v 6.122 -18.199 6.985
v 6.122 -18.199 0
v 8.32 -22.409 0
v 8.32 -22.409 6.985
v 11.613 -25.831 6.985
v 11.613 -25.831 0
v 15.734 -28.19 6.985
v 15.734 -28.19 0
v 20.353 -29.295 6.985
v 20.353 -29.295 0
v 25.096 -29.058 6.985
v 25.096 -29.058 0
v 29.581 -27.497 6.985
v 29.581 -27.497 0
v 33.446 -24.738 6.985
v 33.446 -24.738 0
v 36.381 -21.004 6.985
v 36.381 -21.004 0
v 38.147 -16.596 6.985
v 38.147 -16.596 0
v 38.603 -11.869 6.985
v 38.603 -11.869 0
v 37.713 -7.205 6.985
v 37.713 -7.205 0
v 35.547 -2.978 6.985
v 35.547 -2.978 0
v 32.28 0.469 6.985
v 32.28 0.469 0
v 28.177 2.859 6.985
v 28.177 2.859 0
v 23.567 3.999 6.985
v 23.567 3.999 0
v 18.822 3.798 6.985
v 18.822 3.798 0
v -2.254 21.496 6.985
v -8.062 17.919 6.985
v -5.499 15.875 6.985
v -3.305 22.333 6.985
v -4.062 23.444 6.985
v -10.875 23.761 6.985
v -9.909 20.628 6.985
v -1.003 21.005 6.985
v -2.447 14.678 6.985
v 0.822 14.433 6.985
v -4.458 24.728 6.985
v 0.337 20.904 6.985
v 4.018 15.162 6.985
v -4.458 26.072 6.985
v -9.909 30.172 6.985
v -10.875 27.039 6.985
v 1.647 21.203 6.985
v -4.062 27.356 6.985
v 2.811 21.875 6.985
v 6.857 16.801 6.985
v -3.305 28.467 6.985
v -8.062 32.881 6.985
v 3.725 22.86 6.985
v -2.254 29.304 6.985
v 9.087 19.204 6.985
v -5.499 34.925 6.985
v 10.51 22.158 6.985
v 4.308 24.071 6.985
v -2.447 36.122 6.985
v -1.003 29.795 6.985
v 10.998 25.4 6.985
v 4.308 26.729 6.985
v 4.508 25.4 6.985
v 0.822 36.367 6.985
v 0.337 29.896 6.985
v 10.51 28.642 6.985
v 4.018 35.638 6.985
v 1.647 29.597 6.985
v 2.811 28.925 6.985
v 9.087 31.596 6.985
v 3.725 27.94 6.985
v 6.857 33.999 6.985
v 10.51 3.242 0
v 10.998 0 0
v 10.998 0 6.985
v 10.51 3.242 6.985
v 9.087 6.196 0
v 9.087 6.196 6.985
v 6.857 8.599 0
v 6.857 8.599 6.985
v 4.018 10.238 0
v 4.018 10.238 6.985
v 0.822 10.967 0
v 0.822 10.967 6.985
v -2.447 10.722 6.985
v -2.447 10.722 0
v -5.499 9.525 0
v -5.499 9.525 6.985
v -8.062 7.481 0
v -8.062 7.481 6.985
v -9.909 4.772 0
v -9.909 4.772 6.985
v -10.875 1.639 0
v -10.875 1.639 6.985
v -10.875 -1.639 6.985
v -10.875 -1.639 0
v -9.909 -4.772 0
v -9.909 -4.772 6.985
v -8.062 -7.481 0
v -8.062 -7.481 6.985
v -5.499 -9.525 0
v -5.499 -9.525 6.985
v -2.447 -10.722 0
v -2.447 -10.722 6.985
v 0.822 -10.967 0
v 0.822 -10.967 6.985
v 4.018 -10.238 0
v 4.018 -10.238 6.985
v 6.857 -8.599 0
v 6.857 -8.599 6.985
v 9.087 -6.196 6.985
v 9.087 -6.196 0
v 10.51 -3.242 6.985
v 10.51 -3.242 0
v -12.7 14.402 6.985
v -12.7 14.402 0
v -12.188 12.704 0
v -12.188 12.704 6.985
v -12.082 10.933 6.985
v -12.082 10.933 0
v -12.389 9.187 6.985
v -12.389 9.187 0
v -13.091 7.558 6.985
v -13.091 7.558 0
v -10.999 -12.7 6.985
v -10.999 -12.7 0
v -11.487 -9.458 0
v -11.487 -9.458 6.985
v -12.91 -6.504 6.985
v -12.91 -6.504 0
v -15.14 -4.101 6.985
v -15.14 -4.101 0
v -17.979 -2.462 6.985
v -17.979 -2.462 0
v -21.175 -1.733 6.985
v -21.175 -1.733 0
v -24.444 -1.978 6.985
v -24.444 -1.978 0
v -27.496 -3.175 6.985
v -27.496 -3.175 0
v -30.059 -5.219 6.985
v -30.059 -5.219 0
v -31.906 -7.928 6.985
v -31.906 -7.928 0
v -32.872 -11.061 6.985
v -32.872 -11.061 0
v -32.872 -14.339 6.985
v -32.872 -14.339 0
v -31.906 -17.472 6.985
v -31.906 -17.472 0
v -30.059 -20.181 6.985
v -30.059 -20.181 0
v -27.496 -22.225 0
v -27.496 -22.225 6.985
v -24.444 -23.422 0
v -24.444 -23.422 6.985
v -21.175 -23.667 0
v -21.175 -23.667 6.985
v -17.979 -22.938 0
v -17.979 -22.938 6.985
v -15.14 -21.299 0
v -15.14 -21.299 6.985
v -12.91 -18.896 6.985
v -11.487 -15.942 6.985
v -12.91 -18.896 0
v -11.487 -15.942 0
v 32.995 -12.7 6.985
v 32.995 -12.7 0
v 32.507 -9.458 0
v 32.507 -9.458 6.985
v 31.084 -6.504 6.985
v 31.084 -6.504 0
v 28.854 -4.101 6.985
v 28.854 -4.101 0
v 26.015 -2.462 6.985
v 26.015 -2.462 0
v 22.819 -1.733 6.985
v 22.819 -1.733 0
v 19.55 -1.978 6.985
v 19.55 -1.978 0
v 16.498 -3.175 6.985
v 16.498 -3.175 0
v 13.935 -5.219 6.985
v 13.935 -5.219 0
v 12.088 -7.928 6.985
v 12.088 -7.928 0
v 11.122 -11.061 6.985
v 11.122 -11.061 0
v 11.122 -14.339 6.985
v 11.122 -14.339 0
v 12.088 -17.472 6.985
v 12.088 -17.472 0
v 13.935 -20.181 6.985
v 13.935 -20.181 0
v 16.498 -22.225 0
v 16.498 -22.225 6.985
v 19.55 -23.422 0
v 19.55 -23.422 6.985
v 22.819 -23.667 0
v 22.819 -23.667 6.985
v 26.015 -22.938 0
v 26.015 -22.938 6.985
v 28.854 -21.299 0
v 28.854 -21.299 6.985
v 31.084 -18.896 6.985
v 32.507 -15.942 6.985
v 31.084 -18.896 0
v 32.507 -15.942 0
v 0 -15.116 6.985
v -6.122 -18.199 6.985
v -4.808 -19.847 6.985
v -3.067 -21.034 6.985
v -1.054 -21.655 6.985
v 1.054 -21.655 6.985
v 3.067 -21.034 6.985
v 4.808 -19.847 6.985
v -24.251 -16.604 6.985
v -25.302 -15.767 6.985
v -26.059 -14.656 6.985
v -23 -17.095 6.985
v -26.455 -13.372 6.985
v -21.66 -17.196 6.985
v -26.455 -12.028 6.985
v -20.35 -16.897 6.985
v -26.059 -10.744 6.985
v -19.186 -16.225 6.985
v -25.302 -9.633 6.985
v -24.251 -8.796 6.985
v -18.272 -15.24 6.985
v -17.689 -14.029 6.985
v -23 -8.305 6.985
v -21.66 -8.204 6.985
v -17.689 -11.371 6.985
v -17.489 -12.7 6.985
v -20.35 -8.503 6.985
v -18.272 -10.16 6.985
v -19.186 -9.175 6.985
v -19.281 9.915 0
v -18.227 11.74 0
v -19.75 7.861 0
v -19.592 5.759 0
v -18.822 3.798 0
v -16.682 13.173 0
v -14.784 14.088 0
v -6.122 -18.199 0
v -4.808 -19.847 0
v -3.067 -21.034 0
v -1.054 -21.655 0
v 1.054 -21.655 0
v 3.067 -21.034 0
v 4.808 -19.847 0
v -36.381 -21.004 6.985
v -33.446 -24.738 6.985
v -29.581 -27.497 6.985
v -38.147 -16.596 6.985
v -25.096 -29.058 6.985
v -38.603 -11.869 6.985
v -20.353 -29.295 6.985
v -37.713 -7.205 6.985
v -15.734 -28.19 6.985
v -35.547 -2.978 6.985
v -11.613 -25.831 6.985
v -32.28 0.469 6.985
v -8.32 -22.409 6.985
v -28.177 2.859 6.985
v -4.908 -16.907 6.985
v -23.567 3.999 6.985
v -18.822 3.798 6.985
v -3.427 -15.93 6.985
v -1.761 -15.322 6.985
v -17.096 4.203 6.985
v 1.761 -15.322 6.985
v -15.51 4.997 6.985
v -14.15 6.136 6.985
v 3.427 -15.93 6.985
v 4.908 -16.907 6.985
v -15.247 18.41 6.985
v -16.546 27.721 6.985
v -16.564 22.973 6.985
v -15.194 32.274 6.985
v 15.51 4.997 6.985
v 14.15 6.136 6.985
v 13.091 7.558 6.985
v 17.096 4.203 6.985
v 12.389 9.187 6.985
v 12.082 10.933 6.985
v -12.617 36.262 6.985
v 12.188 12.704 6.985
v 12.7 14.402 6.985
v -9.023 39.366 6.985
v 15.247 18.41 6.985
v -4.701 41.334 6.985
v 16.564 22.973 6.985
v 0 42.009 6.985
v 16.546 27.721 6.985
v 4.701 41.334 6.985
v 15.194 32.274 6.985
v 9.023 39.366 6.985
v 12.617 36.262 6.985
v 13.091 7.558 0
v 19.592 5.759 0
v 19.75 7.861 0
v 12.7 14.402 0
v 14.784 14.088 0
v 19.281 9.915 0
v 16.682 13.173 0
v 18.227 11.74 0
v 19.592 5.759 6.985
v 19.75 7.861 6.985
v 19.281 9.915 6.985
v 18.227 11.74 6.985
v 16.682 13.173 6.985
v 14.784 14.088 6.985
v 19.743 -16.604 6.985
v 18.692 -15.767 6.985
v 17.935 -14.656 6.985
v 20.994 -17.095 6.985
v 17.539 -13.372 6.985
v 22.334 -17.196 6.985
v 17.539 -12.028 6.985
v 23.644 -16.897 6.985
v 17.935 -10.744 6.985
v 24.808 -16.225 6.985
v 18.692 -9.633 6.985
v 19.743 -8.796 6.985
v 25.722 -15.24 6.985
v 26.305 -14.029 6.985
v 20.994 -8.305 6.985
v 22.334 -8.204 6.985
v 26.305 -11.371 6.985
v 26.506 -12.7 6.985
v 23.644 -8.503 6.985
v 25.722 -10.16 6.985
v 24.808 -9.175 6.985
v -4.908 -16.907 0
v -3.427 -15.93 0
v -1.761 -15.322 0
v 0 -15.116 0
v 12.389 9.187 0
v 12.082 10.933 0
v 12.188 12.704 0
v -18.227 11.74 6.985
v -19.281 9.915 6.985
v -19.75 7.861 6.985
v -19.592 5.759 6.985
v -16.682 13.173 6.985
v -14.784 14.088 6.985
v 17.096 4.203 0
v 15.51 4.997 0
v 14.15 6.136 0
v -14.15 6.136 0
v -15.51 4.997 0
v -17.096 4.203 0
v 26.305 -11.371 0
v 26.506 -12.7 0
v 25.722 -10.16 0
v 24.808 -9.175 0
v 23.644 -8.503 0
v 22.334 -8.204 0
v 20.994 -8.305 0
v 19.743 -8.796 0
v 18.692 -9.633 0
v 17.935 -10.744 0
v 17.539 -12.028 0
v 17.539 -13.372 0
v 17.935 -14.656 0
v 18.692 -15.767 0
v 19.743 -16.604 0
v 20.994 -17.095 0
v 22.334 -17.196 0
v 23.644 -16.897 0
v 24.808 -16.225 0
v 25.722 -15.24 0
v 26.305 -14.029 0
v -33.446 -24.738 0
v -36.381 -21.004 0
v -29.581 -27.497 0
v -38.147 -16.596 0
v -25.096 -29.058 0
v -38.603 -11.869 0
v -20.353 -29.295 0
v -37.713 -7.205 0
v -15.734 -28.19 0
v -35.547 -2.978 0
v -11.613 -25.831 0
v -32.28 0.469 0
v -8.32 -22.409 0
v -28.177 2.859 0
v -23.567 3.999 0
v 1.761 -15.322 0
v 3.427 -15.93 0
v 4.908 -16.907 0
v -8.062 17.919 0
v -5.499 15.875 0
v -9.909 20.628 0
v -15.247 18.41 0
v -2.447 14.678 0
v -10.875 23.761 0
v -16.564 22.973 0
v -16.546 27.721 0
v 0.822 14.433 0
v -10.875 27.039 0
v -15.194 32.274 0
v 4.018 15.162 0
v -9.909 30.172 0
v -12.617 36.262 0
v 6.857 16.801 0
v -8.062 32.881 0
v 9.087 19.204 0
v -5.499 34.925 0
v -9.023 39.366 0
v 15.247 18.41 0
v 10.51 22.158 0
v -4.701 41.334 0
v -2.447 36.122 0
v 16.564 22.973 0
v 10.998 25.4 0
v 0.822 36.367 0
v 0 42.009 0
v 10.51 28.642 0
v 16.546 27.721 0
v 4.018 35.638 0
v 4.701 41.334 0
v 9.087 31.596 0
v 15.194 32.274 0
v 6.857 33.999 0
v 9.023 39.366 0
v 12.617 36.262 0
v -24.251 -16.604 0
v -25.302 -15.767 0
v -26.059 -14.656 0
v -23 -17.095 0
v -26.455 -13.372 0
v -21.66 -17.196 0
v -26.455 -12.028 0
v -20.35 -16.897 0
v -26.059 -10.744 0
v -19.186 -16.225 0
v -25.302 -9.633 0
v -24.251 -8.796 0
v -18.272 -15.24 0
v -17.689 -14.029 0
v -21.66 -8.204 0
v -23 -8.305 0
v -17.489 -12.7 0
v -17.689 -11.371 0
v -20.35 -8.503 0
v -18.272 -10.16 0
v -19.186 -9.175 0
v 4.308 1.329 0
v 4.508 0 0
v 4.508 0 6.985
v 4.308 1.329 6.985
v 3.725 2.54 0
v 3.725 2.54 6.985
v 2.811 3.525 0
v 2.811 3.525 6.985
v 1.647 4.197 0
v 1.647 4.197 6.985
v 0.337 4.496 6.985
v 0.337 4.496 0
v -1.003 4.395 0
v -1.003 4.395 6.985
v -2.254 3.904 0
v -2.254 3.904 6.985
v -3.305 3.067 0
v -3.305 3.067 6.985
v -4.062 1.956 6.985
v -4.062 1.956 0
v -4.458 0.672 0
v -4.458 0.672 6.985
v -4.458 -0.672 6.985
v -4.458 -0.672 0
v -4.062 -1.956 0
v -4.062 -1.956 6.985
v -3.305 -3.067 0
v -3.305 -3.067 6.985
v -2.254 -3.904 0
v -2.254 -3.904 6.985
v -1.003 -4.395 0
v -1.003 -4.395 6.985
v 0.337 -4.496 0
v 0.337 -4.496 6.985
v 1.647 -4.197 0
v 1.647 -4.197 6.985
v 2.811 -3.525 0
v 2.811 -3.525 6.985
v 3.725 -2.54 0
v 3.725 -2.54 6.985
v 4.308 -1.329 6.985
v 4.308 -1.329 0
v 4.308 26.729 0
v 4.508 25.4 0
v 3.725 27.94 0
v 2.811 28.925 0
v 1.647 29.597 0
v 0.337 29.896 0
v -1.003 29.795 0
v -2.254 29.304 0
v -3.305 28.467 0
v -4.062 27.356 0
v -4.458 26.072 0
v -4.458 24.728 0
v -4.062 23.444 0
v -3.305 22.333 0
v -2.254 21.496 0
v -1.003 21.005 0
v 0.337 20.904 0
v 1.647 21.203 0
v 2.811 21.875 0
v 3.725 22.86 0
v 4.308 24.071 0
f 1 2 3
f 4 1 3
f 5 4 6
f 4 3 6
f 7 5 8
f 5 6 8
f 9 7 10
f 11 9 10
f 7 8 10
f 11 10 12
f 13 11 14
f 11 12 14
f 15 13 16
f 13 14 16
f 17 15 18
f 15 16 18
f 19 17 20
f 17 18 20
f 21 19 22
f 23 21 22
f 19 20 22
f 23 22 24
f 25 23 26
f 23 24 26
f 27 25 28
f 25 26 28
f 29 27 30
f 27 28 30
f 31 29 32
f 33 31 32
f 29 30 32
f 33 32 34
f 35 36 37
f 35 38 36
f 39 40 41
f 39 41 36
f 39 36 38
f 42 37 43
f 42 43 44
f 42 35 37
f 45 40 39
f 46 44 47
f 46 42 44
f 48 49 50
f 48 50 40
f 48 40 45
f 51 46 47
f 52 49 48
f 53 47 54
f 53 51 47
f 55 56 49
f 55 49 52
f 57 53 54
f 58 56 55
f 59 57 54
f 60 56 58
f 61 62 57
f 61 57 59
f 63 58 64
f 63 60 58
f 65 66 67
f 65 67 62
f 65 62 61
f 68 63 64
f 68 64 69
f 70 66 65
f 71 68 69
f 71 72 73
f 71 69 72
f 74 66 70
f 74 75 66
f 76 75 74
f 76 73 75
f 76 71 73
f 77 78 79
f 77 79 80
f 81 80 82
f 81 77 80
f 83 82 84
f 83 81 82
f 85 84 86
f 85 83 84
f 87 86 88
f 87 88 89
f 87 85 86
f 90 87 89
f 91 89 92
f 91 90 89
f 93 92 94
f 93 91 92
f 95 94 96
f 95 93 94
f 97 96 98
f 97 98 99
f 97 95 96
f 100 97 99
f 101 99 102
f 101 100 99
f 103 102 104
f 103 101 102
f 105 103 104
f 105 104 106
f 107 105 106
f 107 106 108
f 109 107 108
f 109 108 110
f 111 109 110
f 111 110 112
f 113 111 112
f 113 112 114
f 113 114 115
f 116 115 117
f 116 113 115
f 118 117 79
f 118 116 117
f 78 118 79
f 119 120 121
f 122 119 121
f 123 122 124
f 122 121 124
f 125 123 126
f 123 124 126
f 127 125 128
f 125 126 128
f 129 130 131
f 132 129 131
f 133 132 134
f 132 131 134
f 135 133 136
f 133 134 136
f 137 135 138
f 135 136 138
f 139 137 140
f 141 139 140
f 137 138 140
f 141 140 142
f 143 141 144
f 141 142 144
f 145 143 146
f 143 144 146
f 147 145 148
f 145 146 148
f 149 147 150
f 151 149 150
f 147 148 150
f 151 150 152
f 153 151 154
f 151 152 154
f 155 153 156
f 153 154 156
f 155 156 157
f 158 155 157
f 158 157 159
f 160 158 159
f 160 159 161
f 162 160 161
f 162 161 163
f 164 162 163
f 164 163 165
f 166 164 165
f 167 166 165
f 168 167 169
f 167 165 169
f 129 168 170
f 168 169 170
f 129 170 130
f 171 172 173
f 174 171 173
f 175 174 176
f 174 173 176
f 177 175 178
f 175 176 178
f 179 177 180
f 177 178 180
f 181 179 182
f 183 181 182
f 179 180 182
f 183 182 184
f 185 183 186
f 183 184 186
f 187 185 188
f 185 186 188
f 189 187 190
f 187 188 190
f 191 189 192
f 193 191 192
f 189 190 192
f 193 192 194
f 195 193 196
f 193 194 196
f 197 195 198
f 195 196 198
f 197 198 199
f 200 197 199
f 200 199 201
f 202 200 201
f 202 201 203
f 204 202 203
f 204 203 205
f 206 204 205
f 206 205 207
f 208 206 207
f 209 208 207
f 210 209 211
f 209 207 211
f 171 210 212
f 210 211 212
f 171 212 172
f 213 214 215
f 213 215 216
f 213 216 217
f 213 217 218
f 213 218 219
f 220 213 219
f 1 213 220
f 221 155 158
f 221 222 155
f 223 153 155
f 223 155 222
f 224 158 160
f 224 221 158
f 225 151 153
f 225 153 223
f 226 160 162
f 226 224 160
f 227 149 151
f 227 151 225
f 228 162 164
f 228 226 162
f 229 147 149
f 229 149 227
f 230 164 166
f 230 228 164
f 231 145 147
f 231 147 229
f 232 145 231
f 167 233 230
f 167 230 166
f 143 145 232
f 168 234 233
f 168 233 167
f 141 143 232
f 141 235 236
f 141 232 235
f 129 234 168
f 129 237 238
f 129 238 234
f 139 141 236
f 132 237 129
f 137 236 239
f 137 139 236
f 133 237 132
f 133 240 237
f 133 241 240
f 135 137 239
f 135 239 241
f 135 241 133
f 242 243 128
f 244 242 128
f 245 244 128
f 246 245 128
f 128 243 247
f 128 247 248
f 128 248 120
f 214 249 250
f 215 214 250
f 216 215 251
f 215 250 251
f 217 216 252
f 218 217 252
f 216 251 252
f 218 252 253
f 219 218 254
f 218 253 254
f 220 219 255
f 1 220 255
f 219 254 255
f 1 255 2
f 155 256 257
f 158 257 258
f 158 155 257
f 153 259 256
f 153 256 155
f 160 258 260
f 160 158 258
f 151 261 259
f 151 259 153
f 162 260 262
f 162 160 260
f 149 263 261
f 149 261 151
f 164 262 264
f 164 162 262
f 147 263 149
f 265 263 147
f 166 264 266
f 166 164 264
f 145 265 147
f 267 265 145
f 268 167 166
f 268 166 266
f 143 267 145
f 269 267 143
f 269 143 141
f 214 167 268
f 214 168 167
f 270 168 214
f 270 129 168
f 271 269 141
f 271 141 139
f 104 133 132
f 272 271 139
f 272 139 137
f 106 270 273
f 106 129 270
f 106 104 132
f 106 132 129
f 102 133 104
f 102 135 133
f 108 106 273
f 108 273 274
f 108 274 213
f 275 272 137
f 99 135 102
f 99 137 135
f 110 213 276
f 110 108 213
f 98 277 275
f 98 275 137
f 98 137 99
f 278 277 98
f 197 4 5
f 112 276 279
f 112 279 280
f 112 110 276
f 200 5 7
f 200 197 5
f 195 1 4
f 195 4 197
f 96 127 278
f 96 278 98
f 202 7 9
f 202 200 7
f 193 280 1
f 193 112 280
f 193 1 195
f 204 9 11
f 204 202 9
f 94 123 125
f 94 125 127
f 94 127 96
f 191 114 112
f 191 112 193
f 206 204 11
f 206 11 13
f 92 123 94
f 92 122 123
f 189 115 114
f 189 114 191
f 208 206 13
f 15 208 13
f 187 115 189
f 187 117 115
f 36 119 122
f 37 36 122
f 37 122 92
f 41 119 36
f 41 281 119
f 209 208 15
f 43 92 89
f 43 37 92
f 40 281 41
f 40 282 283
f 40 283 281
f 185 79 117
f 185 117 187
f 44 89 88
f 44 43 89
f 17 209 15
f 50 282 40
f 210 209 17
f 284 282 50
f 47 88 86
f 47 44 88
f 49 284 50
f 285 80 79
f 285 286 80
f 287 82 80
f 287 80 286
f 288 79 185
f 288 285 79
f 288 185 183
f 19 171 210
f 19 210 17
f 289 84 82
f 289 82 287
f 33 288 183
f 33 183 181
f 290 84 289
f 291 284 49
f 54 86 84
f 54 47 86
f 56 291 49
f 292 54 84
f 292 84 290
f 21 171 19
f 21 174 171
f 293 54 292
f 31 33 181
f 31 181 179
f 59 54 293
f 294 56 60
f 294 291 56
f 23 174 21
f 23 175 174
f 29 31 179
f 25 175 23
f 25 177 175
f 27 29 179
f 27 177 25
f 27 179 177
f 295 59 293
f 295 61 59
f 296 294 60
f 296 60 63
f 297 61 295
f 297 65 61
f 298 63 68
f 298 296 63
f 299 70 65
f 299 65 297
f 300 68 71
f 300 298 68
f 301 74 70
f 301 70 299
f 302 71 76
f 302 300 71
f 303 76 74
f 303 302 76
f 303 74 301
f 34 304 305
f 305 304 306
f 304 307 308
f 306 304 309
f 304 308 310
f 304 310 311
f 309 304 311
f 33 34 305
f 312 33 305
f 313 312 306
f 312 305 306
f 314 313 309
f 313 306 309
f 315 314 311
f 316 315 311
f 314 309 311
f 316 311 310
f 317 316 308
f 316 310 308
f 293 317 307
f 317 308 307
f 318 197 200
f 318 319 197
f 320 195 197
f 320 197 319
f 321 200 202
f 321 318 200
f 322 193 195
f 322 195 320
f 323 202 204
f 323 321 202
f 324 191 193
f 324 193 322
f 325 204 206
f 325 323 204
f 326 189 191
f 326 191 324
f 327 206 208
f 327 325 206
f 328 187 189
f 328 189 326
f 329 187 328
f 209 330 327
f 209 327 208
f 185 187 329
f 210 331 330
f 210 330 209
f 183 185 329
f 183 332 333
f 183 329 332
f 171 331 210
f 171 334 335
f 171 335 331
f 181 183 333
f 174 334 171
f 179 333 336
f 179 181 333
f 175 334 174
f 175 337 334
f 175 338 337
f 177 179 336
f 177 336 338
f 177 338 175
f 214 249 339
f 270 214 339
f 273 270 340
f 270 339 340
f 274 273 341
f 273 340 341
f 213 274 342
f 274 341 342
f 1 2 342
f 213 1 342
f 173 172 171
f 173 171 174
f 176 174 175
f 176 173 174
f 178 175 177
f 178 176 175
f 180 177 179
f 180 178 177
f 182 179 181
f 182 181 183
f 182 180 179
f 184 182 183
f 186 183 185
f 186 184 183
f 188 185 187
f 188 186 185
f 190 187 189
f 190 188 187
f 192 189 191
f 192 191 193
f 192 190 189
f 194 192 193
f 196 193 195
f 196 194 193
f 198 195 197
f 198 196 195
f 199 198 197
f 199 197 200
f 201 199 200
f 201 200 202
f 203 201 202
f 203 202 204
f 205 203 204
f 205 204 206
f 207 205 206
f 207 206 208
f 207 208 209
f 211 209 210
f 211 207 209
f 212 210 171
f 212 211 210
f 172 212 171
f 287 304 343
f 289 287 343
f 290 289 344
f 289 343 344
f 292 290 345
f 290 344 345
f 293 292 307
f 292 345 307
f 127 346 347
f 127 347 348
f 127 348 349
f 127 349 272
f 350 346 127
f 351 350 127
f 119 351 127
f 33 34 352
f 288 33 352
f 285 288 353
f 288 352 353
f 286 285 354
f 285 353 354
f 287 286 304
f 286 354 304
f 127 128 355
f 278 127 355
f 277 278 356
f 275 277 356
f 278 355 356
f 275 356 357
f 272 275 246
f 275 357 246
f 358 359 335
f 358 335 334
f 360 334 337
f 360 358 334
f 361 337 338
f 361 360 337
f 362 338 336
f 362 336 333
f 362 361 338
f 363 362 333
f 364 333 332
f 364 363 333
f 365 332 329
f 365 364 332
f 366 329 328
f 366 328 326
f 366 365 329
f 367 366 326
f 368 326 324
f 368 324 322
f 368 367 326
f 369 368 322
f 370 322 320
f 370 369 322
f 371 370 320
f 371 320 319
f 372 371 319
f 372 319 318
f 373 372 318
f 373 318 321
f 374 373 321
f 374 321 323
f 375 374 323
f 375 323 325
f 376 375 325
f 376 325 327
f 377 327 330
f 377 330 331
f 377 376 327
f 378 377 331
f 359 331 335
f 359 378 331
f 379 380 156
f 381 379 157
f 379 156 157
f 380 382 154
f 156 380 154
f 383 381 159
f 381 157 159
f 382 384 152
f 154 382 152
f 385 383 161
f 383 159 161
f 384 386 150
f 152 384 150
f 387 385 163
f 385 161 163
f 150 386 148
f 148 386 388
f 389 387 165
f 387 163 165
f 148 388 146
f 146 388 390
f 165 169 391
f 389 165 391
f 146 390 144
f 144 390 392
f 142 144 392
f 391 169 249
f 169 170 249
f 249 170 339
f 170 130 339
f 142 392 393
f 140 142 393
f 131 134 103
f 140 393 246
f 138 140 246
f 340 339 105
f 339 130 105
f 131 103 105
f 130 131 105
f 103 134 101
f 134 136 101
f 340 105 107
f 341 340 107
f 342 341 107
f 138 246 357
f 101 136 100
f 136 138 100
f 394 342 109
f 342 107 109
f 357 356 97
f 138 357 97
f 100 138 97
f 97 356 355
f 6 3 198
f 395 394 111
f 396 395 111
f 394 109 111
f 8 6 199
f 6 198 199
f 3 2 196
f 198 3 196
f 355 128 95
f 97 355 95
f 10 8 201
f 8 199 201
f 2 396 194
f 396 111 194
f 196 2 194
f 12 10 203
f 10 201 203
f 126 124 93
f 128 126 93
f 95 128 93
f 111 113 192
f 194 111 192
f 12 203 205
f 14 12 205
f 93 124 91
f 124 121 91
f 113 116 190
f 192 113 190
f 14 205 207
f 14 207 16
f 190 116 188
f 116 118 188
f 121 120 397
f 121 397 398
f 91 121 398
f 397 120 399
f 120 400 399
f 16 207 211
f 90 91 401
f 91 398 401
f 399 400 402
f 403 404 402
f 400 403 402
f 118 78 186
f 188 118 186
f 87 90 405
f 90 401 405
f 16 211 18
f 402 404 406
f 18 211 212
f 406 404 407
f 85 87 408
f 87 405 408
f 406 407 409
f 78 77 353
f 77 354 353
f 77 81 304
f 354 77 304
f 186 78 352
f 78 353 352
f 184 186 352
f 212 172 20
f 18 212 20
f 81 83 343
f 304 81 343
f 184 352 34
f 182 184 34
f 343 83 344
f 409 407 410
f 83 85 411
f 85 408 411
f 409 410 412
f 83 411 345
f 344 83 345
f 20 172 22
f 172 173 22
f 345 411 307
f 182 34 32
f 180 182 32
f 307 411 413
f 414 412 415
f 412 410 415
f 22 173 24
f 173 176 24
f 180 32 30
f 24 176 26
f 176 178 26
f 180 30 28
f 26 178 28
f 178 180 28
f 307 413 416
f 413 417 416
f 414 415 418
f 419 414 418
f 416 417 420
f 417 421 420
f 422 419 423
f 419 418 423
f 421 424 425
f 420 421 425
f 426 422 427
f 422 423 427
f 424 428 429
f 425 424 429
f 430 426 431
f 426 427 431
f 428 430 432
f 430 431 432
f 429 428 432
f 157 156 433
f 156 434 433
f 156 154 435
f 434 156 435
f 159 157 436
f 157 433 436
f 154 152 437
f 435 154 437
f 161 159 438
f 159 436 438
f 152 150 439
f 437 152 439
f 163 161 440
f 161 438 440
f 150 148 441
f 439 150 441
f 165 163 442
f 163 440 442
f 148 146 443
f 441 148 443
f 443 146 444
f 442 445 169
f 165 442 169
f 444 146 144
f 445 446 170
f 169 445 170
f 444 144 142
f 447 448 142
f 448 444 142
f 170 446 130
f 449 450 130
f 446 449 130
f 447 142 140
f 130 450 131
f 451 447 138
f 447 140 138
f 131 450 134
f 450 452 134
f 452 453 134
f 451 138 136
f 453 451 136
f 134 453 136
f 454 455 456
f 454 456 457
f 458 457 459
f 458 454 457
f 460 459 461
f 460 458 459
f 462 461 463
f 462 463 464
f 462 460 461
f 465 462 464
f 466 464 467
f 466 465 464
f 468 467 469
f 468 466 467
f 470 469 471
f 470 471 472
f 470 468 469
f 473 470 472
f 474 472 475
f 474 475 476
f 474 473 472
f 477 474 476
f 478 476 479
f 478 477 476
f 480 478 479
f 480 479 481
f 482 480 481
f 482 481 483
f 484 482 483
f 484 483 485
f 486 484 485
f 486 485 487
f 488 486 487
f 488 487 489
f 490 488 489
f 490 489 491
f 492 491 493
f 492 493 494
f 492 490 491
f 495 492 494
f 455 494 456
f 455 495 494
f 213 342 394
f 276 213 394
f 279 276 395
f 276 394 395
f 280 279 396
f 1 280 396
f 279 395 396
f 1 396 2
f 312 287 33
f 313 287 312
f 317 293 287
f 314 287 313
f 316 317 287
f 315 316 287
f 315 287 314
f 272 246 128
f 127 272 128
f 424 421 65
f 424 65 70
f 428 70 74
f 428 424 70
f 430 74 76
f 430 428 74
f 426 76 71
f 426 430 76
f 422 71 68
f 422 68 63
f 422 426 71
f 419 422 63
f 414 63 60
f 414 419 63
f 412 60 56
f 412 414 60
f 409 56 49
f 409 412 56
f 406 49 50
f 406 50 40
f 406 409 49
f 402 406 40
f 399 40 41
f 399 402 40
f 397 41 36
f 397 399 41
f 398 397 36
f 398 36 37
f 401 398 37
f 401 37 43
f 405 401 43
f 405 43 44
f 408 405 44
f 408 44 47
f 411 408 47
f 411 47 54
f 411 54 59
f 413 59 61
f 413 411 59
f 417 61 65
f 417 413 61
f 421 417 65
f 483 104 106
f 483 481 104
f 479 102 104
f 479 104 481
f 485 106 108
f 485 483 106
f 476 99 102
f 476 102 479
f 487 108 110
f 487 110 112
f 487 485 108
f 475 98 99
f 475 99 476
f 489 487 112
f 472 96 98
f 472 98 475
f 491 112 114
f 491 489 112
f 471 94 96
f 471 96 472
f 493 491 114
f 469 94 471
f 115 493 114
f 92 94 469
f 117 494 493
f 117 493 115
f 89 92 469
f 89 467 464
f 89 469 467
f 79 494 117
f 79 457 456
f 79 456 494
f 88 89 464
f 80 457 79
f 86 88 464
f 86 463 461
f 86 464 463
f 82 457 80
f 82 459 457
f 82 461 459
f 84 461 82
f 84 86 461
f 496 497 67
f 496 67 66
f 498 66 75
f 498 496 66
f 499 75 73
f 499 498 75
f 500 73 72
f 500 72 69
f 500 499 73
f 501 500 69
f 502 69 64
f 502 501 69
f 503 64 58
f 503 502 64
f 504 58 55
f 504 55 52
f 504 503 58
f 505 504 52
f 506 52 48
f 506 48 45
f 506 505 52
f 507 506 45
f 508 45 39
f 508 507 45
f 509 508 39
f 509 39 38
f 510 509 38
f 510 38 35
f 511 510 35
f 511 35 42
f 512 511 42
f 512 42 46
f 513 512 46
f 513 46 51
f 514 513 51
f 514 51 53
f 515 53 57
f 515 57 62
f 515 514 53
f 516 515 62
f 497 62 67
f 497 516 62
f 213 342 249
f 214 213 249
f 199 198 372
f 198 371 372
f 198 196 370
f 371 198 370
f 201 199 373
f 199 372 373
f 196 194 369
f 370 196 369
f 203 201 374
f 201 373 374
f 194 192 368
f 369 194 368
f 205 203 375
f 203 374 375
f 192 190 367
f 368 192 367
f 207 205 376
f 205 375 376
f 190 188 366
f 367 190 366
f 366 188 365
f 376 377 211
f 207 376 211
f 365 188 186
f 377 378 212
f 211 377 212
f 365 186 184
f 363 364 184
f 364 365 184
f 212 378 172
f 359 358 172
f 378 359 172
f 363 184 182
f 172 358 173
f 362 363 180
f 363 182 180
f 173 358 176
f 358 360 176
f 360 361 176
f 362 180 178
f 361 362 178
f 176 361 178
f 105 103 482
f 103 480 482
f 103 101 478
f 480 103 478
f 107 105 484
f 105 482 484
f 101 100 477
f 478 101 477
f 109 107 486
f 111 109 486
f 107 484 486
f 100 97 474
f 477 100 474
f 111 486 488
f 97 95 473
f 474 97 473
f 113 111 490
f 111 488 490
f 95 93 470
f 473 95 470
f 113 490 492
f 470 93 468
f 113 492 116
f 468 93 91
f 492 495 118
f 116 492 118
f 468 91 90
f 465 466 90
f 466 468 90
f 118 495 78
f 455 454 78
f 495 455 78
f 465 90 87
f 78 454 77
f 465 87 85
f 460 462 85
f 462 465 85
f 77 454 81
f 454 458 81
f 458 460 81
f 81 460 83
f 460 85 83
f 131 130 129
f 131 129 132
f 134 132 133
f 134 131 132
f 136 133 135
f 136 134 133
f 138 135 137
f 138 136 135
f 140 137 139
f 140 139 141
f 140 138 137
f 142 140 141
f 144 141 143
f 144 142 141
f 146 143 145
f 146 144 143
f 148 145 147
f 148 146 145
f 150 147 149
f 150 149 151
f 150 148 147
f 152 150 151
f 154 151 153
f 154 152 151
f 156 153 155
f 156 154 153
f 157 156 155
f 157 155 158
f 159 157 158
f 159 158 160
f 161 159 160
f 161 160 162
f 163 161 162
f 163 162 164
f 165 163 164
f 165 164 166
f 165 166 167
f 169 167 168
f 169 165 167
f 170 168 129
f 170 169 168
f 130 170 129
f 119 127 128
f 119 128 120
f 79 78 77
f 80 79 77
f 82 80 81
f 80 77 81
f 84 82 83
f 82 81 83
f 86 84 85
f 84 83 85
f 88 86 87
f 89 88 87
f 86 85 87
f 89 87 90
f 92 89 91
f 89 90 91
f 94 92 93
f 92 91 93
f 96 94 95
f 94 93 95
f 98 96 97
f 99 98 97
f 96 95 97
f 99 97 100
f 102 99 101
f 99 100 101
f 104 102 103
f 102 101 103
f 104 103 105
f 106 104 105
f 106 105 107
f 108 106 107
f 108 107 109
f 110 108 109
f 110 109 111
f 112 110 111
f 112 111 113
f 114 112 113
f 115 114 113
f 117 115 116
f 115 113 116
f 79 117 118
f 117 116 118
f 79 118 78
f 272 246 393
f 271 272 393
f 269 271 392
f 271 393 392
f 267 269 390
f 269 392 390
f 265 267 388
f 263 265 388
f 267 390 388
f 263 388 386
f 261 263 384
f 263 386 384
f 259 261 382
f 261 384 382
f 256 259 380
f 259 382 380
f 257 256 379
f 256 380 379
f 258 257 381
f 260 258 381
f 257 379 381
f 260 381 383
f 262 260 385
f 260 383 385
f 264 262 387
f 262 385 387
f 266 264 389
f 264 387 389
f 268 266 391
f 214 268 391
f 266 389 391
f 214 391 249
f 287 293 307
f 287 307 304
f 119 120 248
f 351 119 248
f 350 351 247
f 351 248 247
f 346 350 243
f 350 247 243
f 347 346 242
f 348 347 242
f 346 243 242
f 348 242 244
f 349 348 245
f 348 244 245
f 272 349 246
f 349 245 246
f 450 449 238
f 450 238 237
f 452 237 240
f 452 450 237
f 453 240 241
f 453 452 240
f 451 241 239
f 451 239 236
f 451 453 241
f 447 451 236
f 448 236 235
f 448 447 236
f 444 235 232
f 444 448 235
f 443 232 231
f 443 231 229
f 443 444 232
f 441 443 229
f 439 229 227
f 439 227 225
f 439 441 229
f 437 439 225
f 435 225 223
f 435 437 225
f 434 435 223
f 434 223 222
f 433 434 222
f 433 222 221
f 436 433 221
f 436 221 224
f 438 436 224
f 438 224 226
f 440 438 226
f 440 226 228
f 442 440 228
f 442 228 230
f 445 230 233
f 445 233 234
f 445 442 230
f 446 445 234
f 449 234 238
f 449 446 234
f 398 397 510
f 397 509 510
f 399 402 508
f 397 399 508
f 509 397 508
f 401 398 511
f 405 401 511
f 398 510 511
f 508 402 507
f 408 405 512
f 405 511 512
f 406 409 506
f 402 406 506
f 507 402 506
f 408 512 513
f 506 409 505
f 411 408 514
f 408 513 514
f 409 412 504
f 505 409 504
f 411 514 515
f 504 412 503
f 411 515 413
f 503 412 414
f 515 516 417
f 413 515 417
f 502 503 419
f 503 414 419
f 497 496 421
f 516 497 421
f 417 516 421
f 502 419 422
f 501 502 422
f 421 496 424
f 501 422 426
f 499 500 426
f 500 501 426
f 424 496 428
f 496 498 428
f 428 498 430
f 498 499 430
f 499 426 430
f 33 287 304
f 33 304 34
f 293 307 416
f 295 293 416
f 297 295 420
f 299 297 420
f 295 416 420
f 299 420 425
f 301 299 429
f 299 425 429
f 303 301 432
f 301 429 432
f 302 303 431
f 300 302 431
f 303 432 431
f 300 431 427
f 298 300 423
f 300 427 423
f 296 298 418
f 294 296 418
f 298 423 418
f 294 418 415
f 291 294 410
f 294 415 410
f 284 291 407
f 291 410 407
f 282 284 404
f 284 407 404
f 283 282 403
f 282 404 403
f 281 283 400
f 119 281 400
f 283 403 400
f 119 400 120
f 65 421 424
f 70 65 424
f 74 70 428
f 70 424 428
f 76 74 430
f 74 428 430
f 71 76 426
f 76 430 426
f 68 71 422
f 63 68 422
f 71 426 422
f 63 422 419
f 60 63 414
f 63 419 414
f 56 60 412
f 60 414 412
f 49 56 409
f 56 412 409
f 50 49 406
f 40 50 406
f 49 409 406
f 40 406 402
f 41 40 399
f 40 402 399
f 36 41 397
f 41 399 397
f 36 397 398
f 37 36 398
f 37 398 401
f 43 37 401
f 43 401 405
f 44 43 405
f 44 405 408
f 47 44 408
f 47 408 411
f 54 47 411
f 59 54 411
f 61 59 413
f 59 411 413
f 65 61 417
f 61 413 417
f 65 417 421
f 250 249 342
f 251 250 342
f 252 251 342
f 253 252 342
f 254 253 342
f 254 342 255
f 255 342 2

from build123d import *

# Parameters (mm, degrees)
F0_R     = 10.9982
F0_R_2   = 4.5085
F1_DEPTH = 6.985
F2_DEPTH = 6.985
F3_DEPTH = 6.985
F4_DEPTH = 6.985
F5_DEPTH = 6.985


with BuildPart() as f1:
    # F0 (on Top) → F1 (new body)
    with BuildSketch(Plane.XY):
        with Locations((-21.997045, -12.7)):
            Circle(F0_R)
        with Locations((-21.997045, -12.7)):
            Circle(F0_R_2, mode=Mode.SUBTRACT)
        with Locations((21.997045, -12.7)):
            Circle(F0_R)
        with Locations((21.997045, -12.7)):
            Circle(F0_R_2, mode=Mode.SUBTRACT)
    extrude(amount=F1_DEPTH)


with BuildPart() as f2:
    # F0 (on Top) → F2 (new body)
    with BuildSketch(Plane.XY):
        with Locations((0, 25.4)):
            Circle(F0_R)
        with Locations((0, 25.4)):
            Circle(F0_R_2, mode=Mode.SUBTRACT)
    extrude(amount=F2_DEPTH)


with BuildPart() as f3:
    # F0 (on Top) → F3 (new body)
    with BuildSketch(Plane.XY):
        Circle(F0_R)
        Circle(F0_R_2, mode=Mode.SUBTRACT)
    extrude(amount=F3_DEPTH)


with BuildPart() as f4:
    # F0 (on Top) → F4 (new body)
    with BuildSketch(Plane.XY):
        with BuildLine():
            ThreePointArc((-13.090936, 7.558055), (-15.509902, 4.996967), (-18.822325, 3.797623))
            ThreePointArc((-18.822325, 3.797623), (-36.380509, -21.004297), (-6.122325, -18.199423))
            ThreePointArc((-6.122325, -18.199423), (-3.427451, -15.930453), (0, -15.116111))
            ThreePointArc((0, -15.116111), (3.427451, -15.930453), (6.122325, -18.199423))
            ThreePointArc((6.122325, -18.199423), (36.380509, -21.004297), (18.822325, 3.797623))
            ThreePointArc((18.822325, 3.797623), (15.509902, 4.996967), (13.090936, 7.558055))
            ThreePointArc((13.090936, 7.558055), (12.082452, 10.933486), (12.7, 14.4018))
            ThreePointArc((12.7, 14.4018), (0, 42.008593), (-12.7, 14.4018))
            ThreePointArc((-12.7, 14.4018), (-12.082452, 10.933486), (-13.090936, 7.558055))
        make_face()
        with Locations((-21.997045, -12.7)):
            Circle(F0_R, mode=Mode.SUBTRACT)
        Circle(F0_R, mode=Mode.SUBTRACT)
        with Locations((21.997045, -12.7)):
            Circle(F0_R, mode=Mode.SUBTRACT)
        with Locations((0, 25.4)):
            Circle(F0_R, mode=Mode.SUBTRACT)
    extrude(amount=F4_DEPTH)


with BuildPart() as f5:
    # F0 (on Top) → F5 (new body)
    with BuildSketch(Plane.XY):
        with BuildLine():
            ThreePointArc((-12.7, 14.4018), (-18.822325, 10.867074), (-18.822325, 3.797623))
            Line((-18.822325, 3.797623), (-13.090936, 7.558055))
            Line((-13.090936, 7.558055), (-12.7, 14.4018))
        make_face()
        with BuildLine():
            ThreePointArc((18.822325, 3.797623), (18.822325, 10.867074), (12.7, 14.4018))
            Line((12.7, 14.4018), (13.090936, 7.558055))
            Line((13.090936, 7.558055), (18.822325, 3.797623))
        make_face()
        with BuildLine():
            Line((0, -15.116111), (-6.122325, -18.199423))
            ThreePointArc((-6.122325, -18.199423), (0, -21.734148), (6.122325, -18.199423))
            Line((6.122325, -18.199423), (0, -15.116111))
        make_face()
    extrude(amount=F5_DEPTH)


solid = Compound([f1.part, f2.part, f3.part, f4.part, f5.part])
